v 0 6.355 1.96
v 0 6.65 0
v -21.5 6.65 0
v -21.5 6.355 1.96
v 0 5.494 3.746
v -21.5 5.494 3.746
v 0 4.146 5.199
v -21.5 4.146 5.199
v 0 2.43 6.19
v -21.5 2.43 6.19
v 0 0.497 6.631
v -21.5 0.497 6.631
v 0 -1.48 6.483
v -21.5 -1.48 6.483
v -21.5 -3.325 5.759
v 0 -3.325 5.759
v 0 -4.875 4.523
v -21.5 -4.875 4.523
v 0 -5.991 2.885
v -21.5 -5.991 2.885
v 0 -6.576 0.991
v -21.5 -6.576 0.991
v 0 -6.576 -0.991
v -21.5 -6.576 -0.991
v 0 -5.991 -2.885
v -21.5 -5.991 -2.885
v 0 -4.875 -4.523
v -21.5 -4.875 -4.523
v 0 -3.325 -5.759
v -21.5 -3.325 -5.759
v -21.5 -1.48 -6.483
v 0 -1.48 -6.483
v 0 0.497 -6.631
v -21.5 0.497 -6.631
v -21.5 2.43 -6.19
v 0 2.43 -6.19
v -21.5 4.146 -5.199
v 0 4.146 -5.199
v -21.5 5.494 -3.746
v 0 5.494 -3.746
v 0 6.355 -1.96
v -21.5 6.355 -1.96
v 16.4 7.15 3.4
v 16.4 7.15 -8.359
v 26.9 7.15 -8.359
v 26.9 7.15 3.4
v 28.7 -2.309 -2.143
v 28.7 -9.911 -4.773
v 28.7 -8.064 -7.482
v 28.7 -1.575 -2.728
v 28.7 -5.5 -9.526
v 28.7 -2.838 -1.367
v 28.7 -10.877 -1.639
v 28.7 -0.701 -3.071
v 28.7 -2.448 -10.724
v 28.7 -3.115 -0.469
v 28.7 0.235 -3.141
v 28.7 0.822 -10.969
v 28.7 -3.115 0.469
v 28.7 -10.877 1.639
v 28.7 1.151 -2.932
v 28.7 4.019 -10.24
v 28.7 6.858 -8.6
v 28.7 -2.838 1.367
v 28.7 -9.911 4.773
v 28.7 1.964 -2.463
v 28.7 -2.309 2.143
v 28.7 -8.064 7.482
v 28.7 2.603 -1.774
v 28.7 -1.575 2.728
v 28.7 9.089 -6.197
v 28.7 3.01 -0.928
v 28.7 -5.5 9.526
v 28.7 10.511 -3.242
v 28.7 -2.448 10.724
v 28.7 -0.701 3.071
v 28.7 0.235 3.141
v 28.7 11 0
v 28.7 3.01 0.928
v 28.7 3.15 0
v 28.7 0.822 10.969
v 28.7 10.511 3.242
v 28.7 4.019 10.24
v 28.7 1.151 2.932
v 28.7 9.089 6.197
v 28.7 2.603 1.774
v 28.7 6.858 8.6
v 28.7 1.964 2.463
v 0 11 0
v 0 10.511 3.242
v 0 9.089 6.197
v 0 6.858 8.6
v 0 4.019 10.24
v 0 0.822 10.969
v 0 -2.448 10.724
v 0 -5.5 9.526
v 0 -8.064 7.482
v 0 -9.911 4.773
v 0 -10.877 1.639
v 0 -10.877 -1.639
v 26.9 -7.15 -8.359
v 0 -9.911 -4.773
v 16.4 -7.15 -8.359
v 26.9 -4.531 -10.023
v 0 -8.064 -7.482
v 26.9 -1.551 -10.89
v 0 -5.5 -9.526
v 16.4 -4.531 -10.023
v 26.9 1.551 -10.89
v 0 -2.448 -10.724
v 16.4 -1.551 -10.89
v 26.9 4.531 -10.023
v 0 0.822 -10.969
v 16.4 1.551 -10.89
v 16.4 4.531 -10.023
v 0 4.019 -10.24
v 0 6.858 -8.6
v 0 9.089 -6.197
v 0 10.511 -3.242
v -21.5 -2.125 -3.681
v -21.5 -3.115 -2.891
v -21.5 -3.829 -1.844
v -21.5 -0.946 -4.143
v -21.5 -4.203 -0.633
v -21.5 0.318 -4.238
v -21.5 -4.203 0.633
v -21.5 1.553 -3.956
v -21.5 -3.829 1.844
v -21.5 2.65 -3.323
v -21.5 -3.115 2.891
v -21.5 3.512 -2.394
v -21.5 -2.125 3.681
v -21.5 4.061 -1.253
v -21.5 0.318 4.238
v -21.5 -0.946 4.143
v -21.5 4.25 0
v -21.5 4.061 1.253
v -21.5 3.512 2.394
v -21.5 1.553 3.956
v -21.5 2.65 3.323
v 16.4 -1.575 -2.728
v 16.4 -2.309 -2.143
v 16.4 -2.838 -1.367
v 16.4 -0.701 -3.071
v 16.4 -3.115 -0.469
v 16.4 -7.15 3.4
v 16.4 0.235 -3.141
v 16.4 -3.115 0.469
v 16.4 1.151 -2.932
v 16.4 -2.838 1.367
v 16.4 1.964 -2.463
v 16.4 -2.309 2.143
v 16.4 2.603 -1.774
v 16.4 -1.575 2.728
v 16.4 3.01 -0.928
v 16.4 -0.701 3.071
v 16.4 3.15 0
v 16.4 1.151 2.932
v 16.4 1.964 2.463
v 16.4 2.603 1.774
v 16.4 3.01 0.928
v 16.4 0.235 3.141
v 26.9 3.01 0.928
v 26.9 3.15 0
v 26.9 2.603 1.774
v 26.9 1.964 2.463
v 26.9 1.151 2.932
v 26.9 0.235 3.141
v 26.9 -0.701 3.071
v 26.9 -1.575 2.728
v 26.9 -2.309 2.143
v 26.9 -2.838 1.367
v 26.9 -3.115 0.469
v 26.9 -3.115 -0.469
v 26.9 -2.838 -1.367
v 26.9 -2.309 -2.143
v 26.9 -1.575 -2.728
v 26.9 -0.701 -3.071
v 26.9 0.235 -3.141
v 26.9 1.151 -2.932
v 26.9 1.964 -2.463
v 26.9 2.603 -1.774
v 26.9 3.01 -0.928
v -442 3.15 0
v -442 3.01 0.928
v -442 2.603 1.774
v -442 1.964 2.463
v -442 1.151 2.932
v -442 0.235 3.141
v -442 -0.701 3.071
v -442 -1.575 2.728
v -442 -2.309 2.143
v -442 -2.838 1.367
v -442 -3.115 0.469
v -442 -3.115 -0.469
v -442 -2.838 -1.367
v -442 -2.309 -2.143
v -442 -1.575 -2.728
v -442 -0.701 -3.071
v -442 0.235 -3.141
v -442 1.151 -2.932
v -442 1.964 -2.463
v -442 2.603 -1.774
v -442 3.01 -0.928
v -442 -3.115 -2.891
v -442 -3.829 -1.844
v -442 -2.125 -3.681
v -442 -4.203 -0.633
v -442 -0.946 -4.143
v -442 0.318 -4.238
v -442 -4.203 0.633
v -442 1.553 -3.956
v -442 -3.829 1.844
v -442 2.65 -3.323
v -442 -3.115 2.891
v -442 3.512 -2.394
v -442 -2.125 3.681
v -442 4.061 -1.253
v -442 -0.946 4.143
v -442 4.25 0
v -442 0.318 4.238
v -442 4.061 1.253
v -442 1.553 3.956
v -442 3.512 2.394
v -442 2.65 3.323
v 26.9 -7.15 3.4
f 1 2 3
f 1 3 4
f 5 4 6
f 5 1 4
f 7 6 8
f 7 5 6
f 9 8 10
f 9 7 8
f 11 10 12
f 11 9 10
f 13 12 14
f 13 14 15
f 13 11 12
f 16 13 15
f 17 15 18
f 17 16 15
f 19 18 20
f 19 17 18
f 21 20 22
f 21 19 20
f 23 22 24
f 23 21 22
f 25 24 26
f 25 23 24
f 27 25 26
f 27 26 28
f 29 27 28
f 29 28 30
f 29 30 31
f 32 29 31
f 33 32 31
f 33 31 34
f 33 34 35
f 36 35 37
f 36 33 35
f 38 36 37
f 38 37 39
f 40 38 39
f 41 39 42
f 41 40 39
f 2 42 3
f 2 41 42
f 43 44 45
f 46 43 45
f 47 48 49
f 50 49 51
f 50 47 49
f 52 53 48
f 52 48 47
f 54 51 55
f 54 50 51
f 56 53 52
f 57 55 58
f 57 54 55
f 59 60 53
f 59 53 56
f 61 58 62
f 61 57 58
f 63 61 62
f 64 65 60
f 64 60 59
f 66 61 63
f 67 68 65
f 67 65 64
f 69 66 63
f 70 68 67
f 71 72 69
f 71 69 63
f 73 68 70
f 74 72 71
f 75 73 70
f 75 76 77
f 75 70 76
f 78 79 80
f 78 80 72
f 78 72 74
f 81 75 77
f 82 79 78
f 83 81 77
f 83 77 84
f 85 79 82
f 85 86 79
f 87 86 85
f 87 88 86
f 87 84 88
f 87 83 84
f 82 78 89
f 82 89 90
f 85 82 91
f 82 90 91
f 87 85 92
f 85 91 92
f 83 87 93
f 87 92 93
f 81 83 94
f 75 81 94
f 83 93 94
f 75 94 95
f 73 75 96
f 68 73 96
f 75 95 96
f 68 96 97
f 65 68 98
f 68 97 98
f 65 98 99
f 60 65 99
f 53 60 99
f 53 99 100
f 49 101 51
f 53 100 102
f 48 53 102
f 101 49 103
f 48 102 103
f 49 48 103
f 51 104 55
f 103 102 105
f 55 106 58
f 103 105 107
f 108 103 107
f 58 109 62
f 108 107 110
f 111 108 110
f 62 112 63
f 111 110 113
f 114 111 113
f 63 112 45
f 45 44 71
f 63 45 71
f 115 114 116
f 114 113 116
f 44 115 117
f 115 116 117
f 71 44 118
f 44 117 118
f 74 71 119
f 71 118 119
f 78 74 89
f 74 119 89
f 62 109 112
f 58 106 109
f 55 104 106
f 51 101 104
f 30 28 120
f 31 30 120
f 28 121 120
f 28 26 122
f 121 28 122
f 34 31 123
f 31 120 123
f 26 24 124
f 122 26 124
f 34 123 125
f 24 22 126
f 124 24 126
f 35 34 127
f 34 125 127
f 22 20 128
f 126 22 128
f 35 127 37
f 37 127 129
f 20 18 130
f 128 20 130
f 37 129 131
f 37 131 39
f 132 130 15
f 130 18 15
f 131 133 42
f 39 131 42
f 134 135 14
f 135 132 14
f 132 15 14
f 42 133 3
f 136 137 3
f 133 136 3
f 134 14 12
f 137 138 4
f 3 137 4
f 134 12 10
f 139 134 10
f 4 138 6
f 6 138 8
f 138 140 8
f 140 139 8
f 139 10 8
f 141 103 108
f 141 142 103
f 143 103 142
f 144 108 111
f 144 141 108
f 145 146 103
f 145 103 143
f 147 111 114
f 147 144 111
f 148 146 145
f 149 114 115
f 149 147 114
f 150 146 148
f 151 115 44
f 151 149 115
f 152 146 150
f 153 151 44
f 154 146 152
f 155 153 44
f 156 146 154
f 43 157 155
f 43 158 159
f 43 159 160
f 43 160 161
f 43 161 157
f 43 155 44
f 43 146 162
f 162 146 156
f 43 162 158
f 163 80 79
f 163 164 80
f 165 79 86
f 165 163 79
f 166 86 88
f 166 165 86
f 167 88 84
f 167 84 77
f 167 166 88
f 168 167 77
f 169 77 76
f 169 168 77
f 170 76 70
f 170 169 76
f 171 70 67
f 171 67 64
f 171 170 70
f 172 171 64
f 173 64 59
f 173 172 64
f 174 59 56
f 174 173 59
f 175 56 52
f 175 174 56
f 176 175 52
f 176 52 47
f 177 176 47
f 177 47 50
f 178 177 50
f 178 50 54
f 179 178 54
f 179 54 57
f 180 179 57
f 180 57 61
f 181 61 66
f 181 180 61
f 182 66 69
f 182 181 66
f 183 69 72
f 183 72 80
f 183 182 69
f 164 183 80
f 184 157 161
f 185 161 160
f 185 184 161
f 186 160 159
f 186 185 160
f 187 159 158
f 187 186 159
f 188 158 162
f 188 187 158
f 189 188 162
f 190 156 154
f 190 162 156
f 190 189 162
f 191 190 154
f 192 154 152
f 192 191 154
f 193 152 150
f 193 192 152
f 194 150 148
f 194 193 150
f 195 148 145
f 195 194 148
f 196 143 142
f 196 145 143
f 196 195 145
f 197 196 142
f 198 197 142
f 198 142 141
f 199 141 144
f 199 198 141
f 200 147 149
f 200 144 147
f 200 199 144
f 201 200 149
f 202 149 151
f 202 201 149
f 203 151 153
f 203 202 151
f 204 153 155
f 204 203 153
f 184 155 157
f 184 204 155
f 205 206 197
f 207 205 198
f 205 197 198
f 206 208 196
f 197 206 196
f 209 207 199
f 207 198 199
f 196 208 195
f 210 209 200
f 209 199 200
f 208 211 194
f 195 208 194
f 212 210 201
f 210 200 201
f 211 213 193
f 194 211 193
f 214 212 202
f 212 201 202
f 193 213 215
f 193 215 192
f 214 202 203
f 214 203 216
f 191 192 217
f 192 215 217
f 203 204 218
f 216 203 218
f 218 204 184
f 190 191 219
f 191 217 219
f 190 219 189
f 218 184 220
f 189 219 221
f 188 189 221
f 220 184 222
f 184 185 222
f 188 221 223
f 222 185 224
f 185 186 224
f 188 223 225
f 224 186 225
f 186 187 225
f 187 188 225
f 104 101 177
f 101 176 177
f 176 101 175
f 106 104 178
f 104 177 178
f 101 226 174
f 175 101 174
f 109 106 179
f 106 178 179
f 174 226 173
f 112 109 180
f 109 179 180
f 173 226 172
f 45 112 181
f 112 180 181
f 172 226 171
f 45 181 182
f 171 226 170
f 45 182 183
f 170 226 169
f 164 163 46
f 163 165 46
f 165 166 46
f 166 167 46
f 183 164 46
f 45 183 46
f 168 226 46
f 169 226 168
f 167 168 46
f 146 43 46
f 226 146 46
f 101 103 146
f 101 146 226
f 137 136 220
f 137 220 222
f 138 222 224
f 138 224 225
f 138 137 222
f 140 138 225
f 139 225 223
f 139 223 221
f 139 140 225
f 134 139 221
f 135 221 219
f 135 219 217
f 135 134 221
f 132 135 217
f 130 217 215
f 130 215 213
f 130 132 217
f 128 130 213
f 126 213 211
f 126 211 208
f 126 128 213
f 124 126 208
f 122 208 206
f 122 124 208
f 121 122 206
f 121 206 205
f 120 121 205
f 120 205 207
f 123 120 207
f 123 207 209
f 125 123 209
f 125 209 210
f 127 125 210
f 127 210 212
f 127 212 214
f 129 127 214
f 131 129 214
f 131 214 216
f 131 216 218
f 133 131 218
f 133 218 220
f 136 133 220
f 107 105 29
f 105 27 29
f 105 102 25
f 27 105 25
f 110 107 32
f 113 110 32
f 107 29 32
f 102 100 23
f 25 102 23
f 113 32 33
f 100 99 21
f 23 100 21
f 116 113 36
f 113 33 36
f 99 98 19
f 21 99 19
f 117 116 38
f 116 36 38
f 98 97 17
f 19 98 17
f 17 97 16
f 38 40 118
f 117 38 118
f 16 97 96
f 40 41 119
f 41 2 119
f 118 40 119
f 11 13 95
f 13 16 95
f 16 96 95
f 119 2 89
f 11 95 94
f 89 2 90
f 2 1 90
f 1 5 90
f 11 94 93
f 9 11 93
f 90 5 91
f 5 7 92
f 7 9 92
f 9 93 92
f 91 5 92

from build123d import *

# Parameters (mm, degrees)
F0_R          = 4.25
F0_R_2        = 3.15
F1_DEPTH      = 442
F0_R_3        = 6.65
F2_DEPTH      = 21.5
F0_R_4        = 11
F3_DEPTH      = 28.7
F4_W          = 10.5
F4_H          = 14.3
F5_DEPTH      = 11.001
F5_DEPTH_BACK = 3.4


with BuildPart() as f1:
    # F0 (on Right) → F1 (new body)
    with BuildSketch(Plane.YZ):
        Circle(F0_R)
        Circle(F0_R_2, mode=Mode.SUBTRACT)
    extrude(amount=-F1_DEPTH)

    # F0 (on Right) → F2 (join)
    with BuildSketch(Plane.YZ):
        Circle(F0_R_3)
        Circle(F0_R, mode=Mode.SUBTRACT)
    extrude(amount=-F2_DEPTH)

    # F0 (on Right) → F3 (join)
    with BuildSketch(Plane.YZ):
        Circle(F0_R_4)
        Circle(F0_R_3, mode=Mode.SUBTRACT)
        Circle(F0_R_3)
        Circle(F0_R, mode=Mode.SUBTRACT)
        Circle(F0_R)
        Circle(F0_R_2, mode=Mode.SUBTRACT)
    extrude(amount=F3_DEPTH)

    # F4 (on Top) → F5 (cut, two sides)
    with BuildSketch(Plane.XY) as f5_sk:
        with Locations((21.65, 0)):
            Rectangle(F4_W, F4_H)
    extrude(amount=-F5_DEPTH, mode=Mode.SUBTRACT)
    extrude(f5_sk.sketch, amount=F5_DEPTH_BACK, mode=Mode.SUBTRACT)


solid = f1.part
